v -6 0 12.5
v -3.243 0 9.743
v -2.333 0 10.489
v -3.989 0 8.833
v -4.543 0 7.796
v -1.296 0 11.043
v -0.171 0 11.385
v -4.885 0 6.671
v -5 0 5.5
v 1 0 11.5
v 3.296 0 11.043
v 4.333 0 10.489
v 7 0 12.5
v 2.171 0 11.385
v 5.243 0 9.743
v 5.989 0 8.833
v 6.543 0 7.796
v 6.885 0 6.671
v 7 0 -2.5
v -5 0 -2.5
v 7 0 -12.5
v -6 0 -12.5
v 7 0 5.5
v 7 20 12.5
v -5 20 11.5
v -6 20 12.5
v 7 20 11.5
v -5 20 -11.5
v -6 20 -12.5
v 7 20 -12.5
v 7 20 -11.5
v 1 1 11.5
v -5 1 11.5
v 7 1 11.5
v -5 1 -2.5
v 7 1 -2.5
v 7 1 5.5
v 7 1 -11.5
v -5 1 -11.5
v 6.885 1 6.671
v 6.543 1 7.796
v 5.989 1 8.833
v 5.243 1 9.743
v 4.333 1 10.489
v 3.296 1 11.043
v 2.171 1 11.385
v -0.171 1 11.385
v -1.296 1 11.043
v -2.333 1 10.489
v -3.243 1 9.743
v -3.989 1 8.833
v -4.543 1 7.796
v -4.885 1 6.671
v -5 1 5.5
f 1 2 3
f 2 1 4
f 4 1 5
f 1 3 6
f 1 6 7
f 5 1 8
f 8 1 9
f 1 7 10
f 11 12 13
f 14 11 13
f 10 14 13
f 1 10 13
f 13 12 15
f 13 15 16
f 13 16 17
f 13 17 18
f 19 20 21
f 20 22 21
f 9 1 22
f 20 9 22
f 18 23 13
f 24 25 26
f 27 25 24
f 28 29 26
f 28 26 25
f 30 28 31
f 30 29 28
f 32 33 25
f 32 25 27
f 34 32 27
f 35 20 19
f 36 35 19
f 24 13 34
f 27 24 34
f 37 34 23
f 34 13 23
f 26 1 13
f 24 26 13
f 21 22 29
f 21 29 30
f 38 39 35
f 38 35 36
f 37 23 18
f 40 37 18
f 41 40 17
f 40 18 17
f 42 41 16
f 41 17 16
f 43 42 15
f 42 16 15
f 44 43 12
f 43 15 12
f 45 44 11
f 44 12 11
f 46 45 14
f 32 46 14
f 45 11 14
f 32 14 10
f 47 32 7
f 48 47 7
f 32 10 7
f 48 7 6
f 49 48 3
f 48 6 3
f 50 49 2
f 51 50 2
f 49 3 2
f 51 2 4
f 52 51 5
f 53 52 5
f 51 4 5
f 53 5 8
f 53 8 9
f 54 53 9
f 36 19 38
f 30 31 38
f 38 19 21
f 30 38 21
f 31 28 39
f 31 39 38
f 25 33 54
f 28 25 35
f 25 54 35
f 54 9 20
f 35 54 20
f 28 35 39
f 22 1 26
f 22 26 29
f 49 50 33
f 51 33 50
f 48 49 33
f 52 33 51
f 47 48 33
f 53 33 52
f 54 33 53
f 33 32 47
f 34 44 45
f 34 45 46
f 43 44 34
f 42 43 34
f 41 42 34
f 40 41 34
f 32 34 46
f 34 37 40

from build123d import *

# Parameters (mm, degrees)
SKETCH_15_W          = 13
SKETCH_15_H          = 25
EXTRUDE_4_DEPTH      = 20
CUT_EXTRUDE_START    = 1
SKETCH_16_W          = 12
SKETCH_16_H          = 23
CUT_EXTRUDE_47_DEPTH = 24.6018292
CUT_EXTRUDE_48_DEPTH = 25.6018292


with BuildPart() as part:
    # 스케치15 → 보스-돌출4 (new body)
    with BuildSketch(Plane(origin=(0, 0, 0), x_dir=(1, 0, 0), z_dir=(0, 1, 0))):
        with Locations((0.5, 0)):
            Rectangle(SKETCH_15_W, SKETCH_15_H)
    extrude(amount=EXTRUDE_4_DEPTH)

    # 스케치16 → 컷-돌출47 (cut, through all)
    with BuildSketch(Plane(origin=(0, 0, 0), x_dir=(1, 0, 0), z_dir=(0, 1, 0)).offset(CUT_EXTRUDE_START)):
        with Locations((1, 0)):
            Rectangle(SKETCH_16_W, SKETCH_16_H)
    extrude(amount=CUT_EXTRUDE_47_DEPTH, mode=Mode.SUBTRACT)

    # 스케치17 → 컷-돌출48 (cut, through all)
    with BuildSketch(Plane(origin=(0, 0, 0), x_dir=(1, 0, 0), z_dir=(0, 1, 0))):
        with BuildLine():
            Line((-5, 2.5), (7, 2.5))
            Line((7, 2.5), (7, -5.5))
            ThreePointArc((7, -5.5), (1, -11.5), (-5, -5.5))
            Line((-5, -5.5), (-5, 2.5))
        make_face()
    extrude(amount=CUT_EXTRUDE_48_DEPTH, mode=Mode.SUBTRACT)


solid = part.part
